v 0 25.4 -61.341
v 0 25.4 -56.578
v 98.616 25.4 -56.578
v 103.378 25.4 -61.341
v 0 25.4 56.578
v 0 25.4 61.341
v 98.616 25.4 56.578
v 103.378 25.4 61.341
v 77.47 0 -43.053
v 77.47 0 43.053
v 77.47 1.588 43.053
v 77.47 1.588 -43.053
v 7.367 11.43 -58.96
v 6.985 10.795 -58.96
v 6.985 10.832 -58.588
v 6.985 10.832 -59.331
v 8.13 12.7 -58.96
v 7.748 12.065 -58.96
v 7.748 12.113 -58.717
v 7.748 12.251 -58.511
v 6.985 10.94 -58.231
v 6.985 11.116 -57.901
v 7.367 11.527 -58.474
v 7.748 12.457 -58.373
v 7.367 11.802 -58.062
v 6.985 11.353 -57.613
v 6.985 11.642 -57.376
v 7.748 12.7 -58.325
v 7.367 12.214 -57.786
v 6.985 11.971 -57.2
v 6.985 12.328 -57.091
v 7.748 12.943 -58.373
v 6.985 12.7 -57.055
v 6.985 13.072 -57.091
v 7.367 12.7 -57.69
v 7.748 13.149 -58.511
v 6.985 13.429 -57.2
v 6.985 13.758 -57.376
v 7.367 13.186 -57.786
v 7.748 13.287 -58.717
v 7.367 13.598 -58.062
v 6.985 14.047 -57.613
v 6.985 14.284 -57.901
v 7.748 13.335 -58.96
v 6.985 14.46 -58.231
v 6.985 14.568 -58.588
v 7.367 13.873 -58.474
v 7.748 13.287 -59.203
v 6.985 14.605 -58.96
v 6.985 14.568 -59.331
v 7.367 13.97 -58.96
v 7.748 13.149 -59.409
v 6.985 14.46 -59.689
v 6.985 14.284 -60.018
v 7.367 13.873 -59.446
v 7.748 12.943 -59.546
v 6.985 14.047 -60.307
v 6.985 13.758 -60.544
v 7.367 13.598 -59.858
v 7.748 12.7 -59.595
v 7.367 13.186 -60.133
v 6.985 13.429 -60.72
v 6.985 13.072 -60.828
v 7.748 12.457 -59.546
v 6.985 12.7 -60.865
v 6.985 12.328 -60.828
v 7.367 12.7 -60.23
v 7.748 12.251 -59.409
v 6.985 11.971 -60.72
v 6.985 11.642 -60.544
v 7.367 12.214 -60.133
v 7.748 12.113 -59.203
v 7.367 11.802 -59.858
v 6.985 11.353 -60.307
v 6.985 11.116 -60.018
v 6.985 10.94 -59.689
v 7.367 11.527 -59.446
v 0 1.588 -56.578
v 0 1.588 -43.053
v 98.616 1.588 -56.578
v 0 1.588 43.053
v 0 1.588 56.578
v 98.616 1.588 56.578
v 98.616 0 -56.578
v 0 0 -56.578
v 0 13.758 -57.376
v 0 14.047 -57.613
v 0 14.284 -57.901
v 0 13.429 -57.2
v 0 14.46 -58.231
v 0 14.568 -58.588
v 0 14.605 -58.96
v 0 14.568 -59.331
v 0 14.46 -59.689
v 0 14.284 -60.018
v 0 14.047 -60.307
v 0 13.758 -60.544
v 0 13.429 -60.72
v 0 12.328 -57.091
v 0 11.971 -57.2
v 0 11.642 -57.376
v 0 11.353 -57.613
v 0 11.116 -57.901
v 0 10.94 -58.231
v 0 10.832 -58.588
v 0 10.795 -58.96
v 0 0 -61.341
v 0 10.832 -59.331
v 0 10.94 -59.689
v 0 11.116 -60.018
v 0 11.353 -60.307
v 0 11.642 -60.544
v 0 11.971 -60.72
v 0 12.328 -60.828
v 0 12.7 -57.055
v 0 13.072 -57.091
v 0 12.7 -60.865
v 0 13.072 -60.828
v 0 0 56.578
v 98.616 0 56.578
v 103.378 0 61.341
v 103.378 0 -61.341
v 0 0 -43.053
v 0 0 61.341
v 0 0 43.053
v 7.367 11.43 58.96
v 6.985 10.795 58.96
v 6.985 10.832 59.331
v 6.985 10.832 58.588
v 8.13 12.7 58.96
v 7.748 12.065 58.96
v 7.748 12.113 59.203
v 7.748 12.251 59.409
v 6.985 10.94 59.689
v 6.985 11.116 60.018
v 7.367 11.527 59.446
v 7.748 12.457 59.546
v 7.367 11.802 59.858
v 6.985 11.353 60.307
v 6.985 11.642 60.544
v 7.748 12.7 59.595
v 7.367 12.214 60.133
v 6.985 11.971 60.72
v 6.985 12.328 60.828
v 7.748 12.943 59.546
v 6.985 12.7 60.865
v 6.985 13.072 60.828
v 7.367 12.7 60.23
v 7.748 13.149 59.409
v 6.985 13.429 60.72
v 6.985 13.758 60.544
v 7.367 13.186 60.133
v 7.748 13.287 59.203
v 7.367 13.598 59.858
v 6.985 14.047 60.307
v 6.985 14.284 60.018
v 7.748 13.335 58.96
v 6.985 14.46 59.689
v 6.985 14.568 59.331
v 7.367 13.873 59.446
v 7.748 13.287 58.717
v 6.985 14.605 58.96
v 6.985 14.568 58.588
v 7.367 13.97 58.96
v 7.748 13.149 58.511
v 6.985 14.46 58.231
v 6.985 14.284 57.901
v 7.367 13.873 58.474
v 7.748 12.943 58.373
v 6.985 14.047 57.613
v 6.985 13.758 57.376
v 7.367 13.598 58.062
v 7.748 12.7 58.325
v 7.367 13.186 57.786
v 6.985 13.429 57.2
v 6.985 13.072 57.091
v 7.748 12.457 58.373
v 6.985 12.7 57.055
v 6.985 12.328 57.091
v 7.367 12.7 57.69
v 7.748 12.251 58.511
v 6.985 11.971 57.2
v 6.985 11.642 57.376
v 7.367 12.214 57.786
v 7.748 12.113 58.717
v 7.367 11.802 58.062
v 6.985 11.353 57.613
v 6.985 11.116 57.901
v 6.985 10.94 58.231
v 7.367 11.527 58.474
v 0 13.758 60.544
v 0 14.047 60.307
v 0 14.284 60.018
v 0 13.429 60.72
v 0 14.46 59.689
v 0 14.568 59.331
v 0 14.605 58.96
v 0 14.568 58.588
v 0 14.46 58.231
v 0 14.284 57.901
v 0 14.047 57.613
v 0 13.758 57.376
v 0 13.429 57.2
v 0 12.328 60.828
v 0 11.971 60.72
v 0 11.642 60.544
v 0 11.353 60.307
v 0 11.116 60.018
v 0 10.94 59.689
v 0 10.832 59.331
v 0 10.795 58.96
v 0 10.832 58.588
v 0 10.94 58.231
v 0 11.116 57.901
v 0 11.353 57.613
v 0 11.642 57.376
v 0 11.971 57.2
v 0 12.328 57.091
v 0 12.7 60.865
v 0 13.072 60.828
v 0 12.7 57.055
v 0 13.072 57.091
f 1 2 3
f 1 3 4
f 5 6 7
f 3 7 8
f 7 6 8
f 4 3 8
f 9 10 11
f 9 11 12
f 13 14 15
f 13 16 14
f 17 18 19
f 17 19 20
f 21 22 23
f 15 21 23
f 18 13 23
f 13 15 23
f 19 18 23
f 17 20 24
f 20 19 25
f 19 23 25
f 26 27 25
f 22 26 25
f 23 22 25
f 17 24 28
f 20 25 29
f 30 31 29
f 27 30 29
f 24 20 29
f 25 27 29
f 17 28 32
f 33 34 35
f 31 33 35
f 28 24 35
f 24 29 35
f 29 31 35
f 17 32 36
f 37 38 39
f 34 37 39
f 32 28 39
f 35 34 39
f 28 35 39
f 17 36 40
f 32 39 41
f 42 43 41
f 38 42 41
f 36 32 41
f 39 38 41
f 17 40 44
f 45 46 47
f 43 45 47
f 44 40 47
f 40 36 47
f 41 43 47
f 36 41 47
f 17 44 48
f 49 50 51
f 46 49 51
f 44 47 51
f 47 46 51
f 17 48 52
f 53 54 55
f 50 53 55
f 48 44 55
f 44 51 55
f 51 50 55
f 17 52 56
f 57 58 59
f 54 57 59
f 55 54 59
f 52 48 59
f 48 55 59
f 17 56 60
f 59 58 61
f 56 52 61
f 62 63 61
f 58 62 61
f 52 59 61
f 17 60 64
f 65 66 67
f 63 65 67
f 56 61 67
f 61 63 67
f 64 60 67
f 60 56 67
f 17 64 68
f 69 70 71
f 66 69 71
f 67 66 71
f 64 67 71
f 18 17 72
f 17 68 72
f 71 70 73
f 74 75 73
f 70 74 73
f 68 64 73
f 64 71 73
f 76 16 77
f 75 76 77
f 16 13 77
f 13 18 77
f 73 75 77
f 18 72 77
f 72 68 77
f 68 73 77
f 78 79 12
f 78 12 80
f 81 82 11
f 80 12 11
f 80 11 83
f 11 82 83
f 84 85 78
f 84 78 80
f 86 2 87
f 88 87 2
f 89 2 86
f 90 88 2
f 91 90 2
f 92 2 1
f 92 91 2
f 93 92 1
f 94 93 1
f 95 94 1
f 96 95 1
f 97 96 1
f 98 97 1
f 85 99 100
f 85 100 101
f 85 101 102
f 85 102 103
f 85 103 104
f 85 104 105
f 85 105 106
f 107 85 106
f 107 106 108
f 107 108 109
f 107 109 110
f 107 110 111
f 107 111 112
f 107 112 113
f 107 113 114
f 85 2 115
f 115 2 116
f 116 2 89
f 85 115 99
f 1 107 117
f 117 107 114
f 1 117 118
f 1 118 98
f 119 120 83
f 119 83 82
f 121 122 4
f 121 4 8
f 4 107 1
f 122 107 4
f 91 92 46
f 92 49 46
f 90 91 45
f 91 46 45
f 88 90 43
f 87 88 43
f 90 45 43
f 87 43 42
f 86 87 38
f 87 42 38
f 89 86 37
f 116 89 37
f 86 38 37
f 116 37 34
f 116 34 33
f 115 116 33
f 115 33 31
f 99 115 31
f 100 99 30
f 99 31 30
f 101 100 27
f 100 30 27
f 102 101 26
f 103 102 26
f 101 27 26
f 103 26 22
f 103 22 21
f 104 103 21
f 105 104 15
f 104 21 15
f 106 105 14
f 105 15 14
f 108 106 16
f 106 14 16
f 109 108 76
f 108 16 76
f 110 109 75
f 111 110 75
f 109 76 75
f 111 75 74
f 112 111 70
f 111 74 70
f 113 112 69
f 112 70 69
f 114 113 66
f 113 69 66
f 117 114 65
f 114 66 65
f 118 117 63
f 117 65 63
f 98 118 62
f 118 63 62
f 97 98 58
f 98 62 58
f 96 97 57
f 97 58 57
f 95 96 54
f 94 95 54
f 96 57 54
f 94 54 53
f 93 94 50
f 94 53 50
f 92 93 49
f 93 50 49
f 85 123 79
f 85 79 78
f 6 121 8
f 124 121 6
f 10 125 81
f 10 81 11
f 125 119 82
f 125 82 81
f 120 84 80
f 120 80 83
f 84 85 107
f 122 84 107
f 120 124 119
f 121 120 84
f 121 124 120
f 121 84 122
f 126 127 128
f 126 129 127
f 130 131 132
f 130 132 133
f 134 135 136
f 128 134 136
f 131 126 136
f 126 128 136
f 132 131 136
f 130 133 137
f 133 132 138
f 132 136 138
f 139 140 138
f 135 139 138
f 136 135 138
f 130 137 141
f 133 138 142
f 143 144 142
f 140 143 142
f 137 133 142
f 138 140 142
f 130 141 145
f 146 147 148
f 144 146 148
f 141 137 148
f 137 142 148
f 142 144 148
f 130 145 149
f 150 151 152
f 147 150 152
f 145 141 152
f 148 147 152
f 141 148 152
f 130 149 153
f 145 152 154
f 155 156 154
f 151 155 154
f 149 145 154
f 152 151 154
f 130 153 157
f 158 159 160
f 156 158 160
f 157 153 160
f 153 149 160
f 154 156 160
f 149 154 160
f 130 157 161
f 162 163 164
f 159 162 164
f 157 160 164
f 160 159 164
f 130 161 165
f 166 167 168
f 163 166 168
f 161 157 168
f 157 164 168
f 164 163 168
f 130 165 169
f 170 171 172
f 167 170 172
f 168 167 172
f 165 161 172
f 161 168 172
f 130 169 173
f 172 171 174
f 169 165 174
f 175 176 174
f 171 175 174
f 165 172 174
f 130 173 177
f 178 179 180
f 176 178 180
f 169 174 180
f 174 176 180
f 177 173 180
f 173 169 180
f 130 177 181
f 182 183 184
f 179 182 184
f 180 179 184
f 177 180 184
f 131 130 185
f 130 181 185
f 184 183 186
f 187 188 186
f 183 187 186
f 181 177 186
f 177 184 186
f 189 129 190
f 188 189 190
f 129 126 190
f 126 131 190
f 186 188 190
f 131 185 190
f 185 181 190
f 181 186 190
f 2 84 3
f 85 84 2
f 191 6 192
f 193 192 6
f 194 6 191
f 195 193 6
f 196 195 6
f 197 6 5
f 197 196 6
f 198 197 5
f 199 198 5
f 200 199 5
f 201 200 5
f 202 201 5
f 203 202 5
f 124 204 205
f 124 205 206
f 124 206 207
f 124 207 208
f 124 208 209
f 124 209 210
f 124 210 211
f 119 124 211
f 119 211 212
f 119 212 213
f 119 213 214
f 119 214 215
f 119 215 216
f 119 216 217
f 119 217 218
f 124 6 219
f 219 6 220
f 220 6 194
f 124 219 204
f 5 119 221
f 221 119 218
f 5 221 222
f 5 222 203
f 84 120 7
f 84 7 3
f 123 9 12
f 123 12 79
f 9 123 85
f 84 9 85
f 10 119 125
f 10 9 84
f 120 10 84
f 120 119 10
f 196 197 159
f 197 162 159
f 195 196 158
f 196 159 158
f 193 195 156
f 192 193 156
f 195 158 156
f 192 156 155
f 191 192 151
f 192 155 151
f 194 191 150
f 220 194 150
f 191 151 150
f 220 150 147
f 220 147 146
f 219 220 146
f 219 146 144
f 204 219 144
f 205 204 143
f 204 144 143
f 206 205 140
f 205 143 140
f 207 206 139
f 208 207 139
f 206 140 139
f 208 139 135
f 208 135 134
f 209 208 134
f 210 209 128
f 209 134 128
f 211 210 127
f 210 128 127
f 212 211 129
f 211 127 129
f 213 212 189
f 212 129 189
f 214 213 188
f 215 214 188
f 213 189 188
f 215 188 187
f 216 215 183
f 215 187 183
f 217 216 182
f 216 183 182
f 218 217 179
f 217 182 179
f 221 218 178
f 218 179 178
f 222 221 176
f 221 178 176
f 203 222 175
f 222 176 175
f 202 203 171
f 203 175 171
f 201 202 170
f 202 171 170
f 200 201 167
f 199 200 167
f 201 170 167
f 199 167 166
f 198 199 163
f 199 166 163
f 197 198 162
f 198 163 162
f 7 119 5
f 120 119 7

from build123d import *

# Parameters (mm, degrees)
F1_DEPTH = 1.5875
F2_DEPTH = 25.4
F4_D     = 3.81
F4_DEPTH = 6.985
F4_TIP   = 1.1446394792
F6_D     = 3.81
F6_DEPTH = 6.985
F6_TIP   = 1.1446394792


with BuildPart() as f1:
    # F0 (on Front) → F1 (new body)
    with BuildSketch(Plane.XZ):
        Polygon((0, 56.5785), (0, 54.991), (97.028, 54.991), (97.028, -54.991), (0, -54.991), (0, -56.5785), (98.6155, -56.5785), (98.6155, 56.5785), align=None)
        Polygon((0, 43.053), (77.47, 43.053), (77.47, -43.053), (0, -43.053), (0, -54.991), (97.028, -54.991), (97.028, 54.991), (0, 54.991), align=None)
    extrude(amount=-F1_DEPTH)


with BuildPart() as f2:
    # F0 (on Front) → F2 (new body)
    with BuildSketch(Plane.XZ):
        Polygon((0, 61.341), (0, 56.5785), (98.6155, 56.5785), (98.6155, -56.5785), (0, -56.5785), (0, -61.341), (103.378, -61.341), (103.378, 61.341), align=None)
    extrude(amount=-F2_DEPTH)

    # F4
    with Locations(Plane(origin=(0, 0, 0), x_dir=(0, -1, 0), z_dir=(-1, 0, 0))):
        with Locations((-12.7, 58.95975)):
            Hole(F4_D / 2, depth=F4_DEPTH)
            with Locations((0, 0, -(F4_DEPTH + F4_TIP / 2))):  # 118° drill point
                Cone(0, F4_D / 2, F4_TIP, mode=Mode.SUBTRACT)

    # F6
    with Locations(Plane(origin=(0, 0, 0), x_dir=(0, -1, 0), z_dir=(-1, 0, 0))):
        with Locations((-12.7, -58.95975)):
            Hole(F6_D / 2, depth=F6_DEPTH)
            with Locations((0, 0, -(F6_DEPTH + F6_TIP / 2))):  # 118° drill point
                Cone(0, F6_D / 2, F6_TIP, mode=Mode.SUBTRACT)


solid = Compound([f1.part, f2.part])
